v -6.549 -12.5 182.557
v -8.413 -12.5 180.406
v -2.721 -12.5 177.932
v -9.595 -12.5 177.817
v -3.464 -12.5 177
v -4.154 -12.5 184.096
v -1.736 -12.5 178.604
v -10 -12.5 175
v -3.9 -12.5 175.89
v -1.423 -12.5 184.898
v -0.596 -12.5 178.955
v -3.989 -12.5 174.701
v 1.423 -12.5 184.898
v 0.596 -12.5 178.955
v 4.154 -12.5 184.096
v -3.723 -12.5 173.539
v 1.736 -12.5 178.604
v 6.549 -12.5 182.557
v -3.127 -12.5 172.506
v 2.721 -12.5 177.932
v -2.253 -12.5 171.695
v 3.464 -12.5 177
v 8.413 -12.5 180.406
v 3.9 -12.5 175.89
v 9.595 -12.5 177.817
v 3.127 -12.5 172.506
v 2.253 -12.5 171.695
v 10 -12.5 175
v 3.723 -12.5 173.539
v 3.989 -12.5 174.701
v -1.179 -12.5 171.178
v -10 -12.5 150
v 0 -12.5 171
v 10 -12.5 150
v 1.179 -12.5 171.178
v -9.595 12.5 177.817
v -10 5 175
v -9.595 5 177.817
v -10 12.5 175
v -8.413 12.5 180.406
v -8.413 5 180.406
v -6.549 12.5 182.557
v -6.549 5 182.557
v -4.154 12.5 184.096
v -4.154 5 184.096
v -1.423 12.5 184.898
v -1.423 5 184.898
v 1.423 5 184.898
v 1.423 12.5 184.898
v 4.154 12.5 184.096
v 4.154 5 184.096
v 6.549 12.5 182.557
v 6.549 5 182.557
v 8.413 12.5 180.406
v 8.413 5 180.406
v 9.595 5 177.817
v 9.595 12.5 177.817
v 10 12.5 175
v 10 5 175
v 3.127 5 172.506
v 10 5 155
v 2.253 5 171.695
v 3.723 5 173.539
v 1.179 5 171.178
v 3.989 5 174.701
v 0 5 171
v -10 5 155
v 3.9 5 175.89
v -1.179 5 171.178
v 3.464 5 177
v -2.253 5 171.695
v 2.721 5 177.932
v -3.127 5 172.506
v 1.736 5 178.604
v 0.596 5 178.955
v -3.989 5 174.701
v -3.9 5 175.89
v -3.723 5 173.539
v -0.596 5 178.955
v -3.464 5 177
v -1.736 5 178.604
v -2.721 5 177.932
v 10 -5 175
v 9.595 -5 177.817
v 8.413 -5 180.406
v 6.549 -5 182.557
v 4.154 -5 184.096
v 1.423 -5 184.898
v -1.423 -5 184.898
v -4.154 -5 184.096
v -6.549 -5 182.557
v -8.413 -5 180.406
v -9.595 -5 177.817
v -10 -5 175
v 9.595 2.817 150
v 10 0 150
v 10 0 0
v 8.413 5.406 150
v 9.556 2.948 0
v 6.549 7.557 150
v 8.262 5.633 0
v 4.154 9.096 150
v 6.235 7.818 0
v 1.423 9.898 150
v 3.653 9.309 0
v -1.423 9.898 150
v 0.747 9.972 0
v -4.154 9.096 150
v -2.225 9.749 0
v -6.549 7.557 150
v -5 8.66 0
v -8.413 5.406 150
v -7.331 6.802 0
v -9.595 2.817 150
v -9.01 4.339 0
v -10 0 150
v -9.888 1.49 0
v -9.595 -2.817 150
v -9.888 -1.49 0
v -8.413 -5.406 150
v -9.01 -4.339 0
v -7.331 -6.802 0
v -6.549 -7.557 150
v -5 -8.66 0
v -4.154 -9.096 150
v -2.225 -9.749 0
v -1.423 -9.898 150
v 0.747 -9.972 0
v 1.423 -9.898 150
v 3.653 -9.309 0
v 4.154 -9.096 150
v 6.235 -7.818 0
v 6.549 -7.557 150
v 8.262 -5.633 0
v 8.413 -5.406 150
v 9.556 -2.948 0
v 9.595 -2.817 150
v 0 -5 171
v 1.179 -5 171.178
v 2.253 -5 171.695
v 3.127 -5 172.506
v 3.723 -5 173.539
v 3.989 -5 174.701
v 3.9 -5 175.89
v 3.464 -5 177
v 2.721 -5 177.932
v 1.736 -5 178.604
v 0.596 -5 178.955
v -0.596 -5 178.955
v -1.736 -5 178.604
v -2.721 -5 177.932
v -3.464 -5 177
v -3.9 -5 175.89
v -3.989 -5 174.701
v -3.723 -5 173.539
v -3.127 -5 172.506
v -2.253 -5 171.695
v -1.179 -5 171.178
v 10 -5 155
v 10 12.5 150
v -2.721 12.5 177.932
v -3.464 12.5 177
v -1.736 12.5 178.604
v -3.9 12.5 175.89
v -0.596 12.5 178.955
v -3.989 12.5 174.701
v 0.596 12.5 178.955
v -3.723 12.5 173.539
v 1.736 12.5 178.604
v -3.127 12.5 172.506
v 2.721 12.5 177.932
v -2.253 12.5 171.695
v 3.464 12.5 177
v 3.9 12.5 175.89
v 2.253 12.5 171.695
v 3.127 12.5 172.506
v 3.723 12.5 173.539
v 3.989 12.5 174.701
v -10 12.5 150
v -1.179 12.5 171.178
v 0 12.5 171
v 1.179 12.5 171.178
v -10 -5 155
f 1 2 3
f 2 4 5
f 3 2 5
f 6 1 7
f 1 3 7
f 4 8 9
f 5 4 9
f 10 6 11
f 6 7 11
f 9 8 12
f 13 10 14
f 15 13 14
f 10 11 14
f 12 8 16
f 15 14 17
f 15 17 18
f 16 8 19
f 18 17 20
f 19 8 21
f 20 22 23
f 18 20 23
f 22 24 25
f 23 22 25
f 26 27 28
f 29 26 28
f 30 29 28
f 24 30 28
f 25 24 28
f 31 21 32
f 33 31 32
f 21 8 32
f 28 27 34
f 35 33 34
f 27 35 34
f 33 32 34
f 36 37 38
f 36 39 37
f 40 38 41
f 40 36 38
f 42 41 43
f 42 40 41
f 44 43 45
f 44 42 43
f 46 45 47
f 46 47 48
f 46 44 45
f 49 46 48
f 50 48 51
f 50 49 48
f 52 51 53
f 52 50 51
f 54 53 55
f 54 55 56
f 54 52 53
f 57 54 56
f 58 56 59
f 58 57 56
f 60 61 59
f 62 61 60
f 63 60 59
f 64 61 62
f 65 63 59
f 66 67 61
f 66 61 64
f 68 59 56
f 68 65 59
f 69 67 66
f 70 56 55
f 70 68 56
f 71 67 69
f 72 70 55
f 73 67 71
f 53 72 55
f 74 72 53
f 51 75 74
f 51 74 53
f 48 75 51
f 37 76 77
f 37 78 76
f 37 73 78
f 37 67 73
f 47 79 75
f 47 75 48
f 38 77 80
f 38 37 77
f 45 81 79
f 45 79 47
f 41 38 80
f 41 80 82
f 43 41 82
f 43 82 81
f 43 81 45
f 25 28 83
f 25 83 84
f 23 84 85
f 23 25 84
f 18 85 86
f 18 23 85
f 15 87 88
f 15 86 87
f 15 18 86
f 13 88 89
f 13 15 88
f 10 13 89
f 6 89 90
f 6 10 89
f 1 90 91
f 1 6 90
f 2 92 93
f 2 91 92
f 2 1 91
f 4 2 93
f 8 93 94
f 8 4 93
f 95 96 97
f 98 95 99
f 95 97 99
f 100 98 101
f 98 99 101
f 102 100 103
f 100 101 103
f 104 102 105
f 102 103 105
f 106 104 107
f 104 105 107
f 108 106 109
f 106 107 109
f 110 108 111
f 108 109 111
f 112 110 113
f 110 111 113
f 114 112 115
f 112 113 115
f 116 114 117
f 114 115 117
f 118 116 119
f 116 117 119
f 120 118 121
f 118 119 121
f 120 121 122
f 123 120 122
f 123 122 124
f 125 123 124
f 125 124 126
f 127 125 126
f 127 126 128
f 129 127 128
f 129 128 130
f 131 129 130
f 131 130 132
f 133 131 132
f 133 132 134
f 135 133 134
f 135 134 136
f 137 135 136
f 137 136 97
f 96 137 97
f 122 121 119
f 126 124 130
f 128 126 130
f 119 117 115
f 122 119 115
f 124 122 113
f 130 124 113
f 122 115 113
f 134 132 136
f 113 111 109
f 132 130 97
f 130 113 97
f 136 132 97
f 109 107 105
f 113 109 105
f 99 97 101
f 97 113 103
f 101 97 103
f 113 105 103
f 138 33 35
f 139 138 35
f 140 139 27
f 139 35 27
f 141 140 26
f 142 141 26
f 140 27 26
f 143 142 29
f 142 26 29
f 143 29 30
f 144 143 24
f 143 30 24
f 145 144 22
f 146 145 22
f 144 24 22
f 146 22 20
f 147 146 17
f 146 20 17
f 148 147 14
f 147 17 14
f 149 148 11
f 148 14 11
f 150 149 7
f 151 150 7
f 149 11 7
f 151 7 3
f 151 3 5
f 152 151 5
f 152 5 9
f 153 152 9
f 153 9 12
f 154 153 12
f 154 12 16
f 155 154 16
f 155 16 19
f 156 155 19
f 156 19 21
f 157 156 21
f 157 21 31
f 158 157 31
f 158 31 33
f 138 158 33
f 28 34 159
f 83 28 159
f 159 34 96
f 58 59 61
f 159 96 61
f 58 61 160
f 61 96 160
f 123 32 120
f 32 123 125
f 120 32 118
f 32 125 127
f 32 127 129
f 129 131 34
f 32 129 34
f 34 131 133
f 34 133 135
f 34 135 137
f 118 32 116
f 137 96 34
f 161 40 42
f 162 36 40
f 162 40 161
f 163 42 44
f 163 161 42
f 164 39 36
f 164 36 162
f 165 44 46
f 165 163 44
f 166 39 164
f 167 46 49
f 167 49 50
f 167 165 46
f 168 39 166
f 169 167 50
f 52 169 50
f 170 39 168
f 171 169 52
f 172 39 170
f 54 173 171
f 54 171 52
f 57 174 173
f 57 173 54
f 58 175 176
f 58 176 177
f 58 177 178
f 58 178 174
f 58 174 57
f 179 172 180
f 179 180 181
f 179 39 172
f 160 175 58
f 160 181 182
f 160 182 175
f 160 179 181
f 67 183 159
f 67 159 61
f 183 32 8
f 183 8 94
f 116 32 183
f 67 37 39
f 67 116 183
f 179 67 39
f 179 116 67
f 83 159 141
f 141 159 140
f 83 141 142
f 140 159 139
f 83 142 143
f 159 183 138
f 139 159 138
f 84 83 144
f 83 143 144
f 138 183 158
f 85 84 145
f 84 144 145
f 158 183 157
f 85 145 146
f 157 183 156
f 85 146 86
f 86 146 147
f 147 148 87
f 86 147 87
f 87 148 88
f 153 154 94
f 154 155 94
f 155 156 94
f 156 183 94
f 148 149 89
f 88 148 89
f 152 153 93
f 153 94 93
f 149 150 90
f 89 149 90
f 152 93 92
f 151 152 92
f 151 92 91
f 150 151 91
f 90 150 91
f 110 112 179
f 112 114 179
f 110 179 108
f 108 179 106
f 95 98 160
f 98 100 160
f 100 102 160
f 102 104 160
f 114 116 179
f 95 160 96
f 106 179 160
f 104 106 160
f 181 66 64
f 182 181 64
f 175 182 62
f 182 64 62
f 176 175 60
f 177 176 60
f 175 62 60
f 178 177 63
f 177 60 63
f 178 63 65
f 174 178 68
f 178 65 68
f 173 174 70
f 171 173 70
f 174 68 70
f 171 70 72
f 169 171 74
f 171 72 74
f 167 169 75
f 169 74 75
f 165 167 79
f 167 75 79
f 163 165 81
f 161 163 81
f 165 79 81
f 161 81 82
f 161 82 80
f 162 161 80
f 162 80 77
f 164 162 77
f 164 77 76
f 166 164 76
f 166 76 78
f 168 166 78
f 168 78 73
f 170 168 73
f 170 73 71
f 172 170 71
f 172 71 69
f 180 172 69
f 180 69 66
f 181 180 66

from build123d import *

# Parameters (mm, degrees)
SKETCH_2_R          = 10
EXTRUDE_1_DEPTH     = 150
SKETCH_3_W          = 20
SKETCH_3_H          = 25
EXTRUDE_2_DEPTH     = 35
SKETCH_4_W          = 60
SKETCH_4_H          = 10
CUT_EXTRUDE_1_DEPTH = 50
SKETCH_5_R          = 4
CUT_EXTRUDE_2_DEPTH = 50
FILLET_3_RADIUS     = 10
FILLET_3_LENGTH     = 7.5
FILLET_4_RADIUS     = 10
FILLET_4_LENGTH     = 7.5


with BuildPart() as part:
    # 草图2 → 凸台-拉伸1 (new body)
    with BuildSketch(Plane.XY):
        Circle(SKETCH_2_R)
    extrude(amount=EXTRUDE_1_DEPTH)

    # 草图3 → 凸台-拉伸2 (add)
    with BuildSketch(Plane.XY.offset(150)):
        Rectangle(SKETCH_3_W, SKETCH_3_H)
    extrude(amount=EXTRUDE_2_DEPTH)

    # 草图4 → 切除-拉伸1 (cut)
    with BuildSketch(Plane.ZY.offset(10)):
        with Locations((185, 0)):
            Rectangle(SKETCH_4_W, SKETCH_4_H)
    extrude(amount=-CUT_EXTRUDE_1_DEPTH, mode=Mode.SUBTRACT)

    # 草图5 → 切除-拉伸2 (cut)
    with BuildSketch(Plane.XZ.offset(12.5)):
        with Locations(Location((0, 175, 0), (0, 0, 270))):
            Circle(SKETCH_5_R)
    extrude(amount=-CUT_EXTRUDE_2_DEPTH, mode=Mode.SUBTRACT)

    # 圆角3: full round fillet: the end face becomes a half cylinder, R = half its width
    fillet_3_face = Plane((0, -8.75, 185), x_dir=(0, -1, 0), z_dir=(0, 0, 1))  # on the end face: x along it, z out of the body
    fillet_3_slab = fillet_3_face.offset(-FILLET_3_RADIUS / 2) * Box(FILLET_3_LENGTH, 2 * FILLET_3_RADIUS, FILLET_3_RADIUS, mode=Mode.PRIVATE)  # the body's end, R deep
    fillet_3_round = Plane((0, -8.75, 175), x_dir=(0, 0, 1), z_dir=(0, -1, 0)) * Cylinder(FILLET_3_RADIUS, FILLET_3_LENGTH, mode=Mode.PRIVATE)  # its axis R under the face
    add(fillet_3_slab - fillet_3_round, mode=Mode.SUBTRACT)

    # 圆角4: full round fillet: the end face becomes a half cylinder, R = half its width
    fillet_4_face = Plane((0, 8.75, 185), x_dir=(0, 1, 0), z_dir=(0, 0, 1))  # on the end face: x along it, z out of the body
    fillet_4_slab = fillet_4_face.offset(-FILLET_4_RADIUS / 2) * Box(FILLET_4_LENGTH, 2 * FILLET_4_RADIUS, FILLET_4_RADIUS, mode=Mode.PRIVATE)  # the body's end, R deep
    fillet_4_round = Plane((0, 8.75, 175), x_dir=(0, 0, 1), z_dir=(0, 1, 0)) * Cylinder(FILLET_4_RADIUS, FILLET_4_LENGTH, mode=Mode.PRIVATE)  # its axis R under the face
    add(fillet_4_slab - fillet_4_round, mode=Mode.SUBTRACT)


solid = part.part
